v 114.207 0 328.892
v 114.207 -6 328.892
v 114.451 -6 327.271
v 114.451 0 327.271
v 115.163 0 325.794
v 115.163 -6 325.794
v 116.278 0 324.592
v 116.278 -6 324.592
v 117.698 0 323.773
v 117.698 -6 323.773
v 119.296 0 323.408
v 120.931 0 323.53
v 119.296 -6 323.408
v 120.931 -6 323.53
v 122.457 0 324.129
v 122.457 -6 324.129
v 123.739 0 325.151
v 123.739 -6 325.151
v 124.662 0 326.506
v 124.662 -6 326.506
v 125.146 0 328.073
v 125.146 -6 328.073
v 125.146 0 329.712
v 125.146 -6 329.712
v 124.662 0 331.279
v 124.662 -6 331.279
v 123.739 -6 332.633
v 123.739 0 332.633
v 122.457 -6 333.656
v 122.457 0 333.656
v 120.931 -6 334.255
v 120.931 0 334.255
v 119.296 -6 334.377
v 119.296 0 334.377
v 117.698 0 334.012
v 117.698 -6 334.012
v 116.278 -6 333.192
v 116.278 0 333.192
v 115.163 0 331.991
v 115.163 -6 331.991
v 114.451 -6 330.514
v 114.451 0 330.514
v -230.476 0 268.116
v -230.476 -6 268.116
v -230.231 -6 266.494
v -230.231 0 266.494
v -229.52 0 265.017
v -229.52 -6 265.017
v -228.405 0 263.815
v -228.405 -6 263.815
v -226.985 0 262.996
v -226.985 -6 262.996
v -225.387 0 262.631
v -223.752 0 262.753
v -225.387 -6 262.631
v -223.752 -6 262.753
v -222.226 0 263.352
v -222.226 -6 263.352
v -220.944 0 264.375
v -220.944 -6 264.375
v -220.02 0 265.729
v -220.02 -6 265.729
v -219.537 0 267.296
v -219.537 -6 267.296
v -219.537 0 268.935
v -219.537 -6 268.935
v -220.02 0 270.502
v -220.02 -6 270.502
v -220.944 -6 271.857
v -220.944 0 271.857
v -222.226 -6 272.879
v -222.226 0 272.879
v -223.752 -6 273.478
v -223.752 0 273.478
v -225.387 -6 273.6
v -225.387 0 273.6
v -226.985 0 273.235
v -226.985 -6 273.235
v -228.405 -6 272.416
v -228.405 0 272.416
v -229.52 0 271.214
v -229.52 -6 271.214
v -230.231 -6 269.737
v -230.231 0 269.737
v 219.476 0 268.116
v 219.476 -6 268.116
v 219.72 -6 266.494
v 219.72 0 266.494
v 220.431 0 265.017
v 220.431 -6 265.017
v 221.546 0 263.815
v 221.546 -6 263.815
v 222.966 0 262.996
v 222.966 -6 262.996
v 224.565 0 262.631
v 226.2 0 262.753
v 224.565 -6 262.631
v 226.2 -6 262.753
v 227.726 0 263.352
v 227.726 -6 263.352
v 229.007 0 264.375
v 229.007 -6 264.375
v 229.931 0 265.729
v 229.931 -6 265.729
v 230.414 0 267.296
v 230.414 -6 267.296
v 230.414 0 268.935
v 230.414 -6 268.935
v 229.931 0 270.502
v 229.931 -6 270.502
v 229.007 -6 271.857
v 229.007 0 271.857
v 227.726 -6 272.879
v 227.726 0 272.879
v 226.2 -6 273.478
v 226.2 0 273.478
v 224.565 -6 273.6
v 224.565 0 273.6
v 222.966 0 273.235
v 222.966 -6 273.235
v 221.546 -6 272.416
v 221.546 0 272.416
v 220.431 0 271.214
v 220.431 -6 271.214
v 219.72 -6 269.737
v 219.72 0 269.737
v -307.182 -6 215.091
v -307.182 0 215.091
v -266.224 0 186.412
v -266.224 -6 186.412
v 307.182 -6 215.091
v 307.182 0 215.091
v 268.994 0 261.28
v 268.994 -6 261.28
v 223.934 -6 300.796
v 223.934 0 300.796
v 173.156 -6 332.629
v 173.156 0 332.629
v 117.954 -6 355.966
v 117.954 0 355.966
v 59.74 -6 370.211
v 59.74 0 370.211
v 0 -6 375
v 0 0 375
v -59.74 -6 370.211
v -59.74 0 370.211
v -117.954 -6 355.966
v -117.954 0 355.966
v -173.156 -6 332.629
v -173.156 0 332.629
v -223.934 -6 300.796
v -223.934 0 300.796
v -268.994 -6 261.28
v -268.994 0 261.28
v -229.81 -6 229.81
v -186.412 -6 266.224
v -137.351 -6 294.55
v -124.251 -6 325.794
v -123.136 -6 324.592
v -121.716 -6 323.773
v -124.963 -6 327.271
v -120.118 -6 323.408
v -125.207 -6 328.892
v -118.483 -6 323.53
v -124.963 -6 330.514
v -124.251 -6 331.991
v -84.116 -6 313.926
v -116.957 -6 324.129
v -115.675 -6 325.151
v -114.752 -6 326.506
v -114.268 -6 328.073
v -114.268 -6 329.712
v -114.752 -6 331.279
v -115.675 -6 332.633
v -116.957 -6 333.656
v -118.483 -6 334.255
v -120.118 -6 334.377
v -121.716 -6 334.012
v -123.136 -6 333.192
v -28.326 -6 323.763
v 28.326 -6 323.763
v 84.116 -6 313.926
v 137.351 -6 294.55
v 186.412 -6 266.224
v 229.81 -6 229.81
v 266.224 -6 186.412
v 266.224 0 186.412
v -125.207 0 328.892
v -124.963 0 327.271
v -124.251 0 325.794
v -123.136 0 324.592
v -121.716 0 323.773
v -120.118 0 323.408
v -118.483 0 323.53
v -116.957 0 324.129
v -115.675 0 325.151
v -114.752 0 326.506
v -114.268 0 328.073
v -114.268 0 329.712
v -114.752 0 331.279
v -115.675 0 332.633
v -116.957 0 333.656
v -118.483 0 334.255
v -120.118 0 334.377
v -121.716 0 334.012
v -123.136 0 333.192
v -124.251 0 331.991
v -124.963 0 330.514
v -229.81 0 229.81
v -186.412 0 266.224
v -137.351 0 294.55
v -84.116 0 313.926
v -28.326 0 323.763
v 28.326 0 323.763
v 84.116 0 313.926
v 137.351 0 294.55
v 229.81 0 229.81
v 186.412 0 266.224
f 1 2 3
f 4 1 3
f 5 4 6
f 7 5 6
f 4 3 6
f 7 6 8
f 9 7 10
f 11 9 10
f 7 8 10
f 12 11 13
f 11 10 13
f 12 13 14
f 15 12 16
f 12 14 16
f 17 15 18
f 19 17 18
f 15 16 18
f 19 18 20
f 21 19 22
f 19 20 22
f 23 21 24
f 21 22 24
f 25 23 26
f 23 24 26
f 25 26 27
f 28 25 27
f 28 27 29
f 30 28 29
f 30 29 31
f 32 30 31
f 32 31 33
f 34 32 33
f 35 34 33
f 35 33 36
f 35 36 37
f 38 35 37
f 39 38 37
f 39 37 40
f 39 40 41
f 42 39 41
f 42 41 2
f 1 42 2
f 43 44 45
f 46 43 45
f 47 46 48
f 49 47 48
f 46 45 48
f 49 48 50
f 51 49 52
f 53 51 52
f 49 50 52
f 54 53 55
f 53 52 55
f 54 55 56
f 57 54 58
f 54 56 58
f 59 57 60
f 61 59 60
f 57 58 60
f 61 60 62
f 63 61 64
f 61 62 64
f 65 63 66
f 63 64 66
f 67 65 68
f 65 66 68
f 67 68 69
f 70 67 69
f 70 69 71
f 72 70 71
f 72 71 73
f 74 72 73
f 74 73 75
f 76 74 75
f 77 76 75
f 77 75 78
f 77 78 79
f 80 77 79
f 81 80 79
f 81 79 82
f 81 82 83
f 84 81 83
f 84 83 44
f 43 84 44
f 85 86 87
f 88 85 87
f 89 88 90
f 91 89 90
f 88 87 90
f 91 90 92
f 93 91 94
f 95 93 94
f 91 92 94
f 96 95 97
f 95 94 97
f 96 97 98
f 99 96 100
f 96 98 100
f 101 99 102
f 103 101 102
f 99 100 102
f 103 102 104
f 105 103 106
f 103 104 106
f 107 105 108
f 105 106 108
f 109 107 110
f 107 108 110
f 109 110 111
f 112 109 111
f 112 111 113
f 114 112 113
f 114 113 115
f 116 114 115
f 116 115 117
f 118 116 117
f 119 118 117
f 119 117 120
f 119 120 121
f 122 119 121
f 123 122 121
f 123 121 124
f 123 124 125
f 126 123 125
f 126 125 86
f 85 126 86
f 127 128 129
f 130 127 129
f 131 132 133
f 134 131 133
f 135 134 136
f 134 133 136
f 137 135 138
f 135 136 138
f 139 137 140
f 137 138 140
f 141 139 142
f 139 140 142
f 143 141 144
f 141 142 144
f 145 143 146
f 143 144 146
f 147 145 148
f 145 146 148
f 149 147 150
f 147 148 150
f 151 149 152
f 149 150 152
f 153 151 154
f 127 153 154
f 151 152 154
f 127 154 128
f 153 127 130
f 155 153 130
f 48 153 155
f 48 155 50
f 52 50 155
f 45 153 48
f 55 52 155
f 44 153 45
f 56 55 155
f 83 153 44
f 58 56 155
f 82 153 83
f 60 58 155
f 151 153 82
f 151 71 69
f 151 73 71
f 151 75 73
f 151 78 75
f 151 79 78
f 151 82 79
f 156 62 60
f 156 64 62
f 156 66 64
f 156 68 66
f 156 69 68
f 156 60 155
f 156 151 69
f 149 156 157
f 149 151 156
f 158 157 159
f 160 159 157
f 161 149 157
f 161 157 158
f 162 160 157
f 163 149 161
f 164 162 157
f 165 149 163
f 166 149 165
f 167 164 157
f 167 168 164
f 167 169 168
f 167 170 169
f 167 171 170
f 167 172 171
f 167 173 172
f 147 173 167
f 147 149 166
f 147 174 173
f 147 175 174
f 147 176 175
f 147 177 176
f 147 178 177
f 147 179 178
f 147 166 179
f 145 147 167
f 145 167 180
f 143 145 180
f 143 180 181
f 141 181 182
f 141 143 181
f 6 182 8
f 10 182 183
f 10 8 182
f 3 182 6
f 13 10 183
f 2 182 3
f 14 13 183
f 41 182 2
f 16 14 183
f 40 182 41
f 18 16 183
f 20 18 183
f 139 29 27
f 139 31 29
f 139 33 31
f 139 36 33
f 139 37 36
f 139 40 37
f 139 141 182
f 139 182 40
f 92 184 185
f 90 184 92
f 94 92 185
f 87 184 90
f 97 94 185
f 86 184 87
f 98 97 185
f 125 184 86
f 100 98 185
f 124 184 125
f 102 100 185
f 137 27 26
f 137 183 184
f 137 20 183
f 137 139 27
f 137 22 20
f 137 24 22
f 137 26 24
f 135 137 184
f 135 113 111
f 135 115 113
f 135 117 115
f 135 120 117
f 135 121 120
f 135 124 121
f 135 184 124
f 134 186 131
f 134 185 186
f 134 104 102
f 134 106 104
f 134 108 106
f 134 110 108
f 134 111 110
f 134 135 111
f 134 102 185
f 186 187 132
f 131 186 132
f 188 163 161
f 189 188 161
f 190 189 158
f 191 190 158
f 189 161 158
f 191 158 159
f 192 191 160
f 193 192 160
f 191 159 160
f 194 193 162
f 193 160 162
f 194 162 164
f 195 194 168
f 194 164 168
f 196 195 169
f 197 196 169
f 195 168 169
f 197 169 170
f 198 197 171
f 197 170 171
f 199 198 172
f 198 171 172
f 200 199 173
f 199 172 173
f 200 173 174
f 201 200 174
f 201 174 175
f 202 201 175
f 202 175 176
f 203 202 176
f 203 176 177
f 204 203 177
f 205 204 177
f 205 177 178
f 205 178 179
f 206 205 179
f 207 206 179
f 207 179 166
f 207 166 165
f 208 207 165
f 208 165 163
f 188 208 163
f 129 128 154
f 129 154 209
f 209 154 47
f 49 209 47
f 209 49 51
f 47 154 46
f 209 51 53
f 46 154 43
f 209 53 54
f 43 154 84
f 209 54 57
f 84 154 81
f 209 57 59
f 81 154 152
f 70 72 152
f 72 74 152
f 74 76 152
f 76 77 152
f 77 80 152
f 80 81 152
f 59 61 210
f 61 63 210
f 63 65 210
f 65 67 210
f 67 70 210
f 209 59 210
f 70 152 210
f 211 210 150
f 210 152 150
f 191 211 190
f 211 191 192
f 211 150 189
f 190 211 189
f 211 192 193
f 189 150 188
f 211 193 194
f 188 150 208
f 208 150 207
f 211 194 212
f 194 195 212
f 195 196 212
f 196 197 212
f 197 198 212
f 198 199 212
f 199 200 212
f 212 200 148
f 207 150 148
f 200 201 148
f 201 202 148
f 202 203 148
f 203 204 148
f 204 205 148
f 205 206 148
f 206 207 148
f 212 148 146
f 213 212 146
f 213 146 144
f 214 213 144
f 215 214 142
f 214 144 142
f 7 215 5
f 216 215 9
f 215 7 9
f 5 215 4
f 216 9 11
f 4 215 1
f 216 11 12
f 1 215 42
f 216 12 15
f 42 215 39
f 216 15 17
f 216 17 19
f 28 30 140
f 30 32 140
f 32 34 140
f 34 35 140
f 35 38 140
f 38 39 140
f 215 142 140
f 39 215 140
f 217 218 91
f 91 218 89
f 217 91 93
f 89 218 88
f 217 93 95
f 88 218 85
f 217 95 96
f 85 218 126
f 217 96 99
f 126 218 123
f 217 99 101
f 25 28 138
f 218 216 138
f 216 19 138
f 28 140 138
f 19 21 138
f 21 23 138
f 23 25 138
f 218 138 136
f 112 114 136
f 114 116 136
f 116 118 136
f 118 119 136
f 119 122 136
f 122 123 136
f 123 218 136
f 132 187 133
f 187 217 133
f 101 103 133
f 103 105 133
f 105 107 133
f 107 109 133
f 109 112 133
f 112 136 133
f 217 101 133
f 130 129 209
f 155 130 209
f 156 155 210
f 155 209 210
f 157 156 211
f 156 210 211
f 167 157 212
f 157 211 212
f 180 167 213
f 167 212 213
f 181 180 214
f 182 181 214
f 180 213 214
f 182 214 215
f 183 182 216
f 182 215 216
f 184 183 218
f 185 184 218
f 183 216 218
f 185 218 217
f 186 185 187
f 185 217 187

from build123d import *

# Parameters (mm, degrees)
F1_DEPTH = 6
F2_D     = 11


with BuildPart() as f1:
    # F0 (on Front) → F1 (new body)
    with BuildSketch(Plane.XZ):
        with BuildLine():
            Line((266.2244143939, 186.4123418141), (307.1820166084, 215.0911636316))
            ThreePointArc((307.1820166084, 215.0911636316), (0, 375), (-307.1820166084, 215.0911636316))
            Line((-307.1820166084, 215.0911636316), (-266.2244143939, 186.4123418141))
            ThreePointArc((-266.2244143939, 186.4123418141), (0, 325), (266.2244143939, 186.4123418141))
        make_face()
    extrude(amount=F1_DEPTH)

    # F2 (through all)
    with Locations(Plane(origin=(0, 0, 0), x_dir=(1, 0, 0), z_dir=(0, 1, 0))):
        with Locations((-224.9756633903, -268.1155550916), (-119.707050164, -328.8924172751), (119.707050164, -328.8924172751), (224.9756633903, -268.1155550916)):
            Hole(F2_D / 2)


solid = f1.part
